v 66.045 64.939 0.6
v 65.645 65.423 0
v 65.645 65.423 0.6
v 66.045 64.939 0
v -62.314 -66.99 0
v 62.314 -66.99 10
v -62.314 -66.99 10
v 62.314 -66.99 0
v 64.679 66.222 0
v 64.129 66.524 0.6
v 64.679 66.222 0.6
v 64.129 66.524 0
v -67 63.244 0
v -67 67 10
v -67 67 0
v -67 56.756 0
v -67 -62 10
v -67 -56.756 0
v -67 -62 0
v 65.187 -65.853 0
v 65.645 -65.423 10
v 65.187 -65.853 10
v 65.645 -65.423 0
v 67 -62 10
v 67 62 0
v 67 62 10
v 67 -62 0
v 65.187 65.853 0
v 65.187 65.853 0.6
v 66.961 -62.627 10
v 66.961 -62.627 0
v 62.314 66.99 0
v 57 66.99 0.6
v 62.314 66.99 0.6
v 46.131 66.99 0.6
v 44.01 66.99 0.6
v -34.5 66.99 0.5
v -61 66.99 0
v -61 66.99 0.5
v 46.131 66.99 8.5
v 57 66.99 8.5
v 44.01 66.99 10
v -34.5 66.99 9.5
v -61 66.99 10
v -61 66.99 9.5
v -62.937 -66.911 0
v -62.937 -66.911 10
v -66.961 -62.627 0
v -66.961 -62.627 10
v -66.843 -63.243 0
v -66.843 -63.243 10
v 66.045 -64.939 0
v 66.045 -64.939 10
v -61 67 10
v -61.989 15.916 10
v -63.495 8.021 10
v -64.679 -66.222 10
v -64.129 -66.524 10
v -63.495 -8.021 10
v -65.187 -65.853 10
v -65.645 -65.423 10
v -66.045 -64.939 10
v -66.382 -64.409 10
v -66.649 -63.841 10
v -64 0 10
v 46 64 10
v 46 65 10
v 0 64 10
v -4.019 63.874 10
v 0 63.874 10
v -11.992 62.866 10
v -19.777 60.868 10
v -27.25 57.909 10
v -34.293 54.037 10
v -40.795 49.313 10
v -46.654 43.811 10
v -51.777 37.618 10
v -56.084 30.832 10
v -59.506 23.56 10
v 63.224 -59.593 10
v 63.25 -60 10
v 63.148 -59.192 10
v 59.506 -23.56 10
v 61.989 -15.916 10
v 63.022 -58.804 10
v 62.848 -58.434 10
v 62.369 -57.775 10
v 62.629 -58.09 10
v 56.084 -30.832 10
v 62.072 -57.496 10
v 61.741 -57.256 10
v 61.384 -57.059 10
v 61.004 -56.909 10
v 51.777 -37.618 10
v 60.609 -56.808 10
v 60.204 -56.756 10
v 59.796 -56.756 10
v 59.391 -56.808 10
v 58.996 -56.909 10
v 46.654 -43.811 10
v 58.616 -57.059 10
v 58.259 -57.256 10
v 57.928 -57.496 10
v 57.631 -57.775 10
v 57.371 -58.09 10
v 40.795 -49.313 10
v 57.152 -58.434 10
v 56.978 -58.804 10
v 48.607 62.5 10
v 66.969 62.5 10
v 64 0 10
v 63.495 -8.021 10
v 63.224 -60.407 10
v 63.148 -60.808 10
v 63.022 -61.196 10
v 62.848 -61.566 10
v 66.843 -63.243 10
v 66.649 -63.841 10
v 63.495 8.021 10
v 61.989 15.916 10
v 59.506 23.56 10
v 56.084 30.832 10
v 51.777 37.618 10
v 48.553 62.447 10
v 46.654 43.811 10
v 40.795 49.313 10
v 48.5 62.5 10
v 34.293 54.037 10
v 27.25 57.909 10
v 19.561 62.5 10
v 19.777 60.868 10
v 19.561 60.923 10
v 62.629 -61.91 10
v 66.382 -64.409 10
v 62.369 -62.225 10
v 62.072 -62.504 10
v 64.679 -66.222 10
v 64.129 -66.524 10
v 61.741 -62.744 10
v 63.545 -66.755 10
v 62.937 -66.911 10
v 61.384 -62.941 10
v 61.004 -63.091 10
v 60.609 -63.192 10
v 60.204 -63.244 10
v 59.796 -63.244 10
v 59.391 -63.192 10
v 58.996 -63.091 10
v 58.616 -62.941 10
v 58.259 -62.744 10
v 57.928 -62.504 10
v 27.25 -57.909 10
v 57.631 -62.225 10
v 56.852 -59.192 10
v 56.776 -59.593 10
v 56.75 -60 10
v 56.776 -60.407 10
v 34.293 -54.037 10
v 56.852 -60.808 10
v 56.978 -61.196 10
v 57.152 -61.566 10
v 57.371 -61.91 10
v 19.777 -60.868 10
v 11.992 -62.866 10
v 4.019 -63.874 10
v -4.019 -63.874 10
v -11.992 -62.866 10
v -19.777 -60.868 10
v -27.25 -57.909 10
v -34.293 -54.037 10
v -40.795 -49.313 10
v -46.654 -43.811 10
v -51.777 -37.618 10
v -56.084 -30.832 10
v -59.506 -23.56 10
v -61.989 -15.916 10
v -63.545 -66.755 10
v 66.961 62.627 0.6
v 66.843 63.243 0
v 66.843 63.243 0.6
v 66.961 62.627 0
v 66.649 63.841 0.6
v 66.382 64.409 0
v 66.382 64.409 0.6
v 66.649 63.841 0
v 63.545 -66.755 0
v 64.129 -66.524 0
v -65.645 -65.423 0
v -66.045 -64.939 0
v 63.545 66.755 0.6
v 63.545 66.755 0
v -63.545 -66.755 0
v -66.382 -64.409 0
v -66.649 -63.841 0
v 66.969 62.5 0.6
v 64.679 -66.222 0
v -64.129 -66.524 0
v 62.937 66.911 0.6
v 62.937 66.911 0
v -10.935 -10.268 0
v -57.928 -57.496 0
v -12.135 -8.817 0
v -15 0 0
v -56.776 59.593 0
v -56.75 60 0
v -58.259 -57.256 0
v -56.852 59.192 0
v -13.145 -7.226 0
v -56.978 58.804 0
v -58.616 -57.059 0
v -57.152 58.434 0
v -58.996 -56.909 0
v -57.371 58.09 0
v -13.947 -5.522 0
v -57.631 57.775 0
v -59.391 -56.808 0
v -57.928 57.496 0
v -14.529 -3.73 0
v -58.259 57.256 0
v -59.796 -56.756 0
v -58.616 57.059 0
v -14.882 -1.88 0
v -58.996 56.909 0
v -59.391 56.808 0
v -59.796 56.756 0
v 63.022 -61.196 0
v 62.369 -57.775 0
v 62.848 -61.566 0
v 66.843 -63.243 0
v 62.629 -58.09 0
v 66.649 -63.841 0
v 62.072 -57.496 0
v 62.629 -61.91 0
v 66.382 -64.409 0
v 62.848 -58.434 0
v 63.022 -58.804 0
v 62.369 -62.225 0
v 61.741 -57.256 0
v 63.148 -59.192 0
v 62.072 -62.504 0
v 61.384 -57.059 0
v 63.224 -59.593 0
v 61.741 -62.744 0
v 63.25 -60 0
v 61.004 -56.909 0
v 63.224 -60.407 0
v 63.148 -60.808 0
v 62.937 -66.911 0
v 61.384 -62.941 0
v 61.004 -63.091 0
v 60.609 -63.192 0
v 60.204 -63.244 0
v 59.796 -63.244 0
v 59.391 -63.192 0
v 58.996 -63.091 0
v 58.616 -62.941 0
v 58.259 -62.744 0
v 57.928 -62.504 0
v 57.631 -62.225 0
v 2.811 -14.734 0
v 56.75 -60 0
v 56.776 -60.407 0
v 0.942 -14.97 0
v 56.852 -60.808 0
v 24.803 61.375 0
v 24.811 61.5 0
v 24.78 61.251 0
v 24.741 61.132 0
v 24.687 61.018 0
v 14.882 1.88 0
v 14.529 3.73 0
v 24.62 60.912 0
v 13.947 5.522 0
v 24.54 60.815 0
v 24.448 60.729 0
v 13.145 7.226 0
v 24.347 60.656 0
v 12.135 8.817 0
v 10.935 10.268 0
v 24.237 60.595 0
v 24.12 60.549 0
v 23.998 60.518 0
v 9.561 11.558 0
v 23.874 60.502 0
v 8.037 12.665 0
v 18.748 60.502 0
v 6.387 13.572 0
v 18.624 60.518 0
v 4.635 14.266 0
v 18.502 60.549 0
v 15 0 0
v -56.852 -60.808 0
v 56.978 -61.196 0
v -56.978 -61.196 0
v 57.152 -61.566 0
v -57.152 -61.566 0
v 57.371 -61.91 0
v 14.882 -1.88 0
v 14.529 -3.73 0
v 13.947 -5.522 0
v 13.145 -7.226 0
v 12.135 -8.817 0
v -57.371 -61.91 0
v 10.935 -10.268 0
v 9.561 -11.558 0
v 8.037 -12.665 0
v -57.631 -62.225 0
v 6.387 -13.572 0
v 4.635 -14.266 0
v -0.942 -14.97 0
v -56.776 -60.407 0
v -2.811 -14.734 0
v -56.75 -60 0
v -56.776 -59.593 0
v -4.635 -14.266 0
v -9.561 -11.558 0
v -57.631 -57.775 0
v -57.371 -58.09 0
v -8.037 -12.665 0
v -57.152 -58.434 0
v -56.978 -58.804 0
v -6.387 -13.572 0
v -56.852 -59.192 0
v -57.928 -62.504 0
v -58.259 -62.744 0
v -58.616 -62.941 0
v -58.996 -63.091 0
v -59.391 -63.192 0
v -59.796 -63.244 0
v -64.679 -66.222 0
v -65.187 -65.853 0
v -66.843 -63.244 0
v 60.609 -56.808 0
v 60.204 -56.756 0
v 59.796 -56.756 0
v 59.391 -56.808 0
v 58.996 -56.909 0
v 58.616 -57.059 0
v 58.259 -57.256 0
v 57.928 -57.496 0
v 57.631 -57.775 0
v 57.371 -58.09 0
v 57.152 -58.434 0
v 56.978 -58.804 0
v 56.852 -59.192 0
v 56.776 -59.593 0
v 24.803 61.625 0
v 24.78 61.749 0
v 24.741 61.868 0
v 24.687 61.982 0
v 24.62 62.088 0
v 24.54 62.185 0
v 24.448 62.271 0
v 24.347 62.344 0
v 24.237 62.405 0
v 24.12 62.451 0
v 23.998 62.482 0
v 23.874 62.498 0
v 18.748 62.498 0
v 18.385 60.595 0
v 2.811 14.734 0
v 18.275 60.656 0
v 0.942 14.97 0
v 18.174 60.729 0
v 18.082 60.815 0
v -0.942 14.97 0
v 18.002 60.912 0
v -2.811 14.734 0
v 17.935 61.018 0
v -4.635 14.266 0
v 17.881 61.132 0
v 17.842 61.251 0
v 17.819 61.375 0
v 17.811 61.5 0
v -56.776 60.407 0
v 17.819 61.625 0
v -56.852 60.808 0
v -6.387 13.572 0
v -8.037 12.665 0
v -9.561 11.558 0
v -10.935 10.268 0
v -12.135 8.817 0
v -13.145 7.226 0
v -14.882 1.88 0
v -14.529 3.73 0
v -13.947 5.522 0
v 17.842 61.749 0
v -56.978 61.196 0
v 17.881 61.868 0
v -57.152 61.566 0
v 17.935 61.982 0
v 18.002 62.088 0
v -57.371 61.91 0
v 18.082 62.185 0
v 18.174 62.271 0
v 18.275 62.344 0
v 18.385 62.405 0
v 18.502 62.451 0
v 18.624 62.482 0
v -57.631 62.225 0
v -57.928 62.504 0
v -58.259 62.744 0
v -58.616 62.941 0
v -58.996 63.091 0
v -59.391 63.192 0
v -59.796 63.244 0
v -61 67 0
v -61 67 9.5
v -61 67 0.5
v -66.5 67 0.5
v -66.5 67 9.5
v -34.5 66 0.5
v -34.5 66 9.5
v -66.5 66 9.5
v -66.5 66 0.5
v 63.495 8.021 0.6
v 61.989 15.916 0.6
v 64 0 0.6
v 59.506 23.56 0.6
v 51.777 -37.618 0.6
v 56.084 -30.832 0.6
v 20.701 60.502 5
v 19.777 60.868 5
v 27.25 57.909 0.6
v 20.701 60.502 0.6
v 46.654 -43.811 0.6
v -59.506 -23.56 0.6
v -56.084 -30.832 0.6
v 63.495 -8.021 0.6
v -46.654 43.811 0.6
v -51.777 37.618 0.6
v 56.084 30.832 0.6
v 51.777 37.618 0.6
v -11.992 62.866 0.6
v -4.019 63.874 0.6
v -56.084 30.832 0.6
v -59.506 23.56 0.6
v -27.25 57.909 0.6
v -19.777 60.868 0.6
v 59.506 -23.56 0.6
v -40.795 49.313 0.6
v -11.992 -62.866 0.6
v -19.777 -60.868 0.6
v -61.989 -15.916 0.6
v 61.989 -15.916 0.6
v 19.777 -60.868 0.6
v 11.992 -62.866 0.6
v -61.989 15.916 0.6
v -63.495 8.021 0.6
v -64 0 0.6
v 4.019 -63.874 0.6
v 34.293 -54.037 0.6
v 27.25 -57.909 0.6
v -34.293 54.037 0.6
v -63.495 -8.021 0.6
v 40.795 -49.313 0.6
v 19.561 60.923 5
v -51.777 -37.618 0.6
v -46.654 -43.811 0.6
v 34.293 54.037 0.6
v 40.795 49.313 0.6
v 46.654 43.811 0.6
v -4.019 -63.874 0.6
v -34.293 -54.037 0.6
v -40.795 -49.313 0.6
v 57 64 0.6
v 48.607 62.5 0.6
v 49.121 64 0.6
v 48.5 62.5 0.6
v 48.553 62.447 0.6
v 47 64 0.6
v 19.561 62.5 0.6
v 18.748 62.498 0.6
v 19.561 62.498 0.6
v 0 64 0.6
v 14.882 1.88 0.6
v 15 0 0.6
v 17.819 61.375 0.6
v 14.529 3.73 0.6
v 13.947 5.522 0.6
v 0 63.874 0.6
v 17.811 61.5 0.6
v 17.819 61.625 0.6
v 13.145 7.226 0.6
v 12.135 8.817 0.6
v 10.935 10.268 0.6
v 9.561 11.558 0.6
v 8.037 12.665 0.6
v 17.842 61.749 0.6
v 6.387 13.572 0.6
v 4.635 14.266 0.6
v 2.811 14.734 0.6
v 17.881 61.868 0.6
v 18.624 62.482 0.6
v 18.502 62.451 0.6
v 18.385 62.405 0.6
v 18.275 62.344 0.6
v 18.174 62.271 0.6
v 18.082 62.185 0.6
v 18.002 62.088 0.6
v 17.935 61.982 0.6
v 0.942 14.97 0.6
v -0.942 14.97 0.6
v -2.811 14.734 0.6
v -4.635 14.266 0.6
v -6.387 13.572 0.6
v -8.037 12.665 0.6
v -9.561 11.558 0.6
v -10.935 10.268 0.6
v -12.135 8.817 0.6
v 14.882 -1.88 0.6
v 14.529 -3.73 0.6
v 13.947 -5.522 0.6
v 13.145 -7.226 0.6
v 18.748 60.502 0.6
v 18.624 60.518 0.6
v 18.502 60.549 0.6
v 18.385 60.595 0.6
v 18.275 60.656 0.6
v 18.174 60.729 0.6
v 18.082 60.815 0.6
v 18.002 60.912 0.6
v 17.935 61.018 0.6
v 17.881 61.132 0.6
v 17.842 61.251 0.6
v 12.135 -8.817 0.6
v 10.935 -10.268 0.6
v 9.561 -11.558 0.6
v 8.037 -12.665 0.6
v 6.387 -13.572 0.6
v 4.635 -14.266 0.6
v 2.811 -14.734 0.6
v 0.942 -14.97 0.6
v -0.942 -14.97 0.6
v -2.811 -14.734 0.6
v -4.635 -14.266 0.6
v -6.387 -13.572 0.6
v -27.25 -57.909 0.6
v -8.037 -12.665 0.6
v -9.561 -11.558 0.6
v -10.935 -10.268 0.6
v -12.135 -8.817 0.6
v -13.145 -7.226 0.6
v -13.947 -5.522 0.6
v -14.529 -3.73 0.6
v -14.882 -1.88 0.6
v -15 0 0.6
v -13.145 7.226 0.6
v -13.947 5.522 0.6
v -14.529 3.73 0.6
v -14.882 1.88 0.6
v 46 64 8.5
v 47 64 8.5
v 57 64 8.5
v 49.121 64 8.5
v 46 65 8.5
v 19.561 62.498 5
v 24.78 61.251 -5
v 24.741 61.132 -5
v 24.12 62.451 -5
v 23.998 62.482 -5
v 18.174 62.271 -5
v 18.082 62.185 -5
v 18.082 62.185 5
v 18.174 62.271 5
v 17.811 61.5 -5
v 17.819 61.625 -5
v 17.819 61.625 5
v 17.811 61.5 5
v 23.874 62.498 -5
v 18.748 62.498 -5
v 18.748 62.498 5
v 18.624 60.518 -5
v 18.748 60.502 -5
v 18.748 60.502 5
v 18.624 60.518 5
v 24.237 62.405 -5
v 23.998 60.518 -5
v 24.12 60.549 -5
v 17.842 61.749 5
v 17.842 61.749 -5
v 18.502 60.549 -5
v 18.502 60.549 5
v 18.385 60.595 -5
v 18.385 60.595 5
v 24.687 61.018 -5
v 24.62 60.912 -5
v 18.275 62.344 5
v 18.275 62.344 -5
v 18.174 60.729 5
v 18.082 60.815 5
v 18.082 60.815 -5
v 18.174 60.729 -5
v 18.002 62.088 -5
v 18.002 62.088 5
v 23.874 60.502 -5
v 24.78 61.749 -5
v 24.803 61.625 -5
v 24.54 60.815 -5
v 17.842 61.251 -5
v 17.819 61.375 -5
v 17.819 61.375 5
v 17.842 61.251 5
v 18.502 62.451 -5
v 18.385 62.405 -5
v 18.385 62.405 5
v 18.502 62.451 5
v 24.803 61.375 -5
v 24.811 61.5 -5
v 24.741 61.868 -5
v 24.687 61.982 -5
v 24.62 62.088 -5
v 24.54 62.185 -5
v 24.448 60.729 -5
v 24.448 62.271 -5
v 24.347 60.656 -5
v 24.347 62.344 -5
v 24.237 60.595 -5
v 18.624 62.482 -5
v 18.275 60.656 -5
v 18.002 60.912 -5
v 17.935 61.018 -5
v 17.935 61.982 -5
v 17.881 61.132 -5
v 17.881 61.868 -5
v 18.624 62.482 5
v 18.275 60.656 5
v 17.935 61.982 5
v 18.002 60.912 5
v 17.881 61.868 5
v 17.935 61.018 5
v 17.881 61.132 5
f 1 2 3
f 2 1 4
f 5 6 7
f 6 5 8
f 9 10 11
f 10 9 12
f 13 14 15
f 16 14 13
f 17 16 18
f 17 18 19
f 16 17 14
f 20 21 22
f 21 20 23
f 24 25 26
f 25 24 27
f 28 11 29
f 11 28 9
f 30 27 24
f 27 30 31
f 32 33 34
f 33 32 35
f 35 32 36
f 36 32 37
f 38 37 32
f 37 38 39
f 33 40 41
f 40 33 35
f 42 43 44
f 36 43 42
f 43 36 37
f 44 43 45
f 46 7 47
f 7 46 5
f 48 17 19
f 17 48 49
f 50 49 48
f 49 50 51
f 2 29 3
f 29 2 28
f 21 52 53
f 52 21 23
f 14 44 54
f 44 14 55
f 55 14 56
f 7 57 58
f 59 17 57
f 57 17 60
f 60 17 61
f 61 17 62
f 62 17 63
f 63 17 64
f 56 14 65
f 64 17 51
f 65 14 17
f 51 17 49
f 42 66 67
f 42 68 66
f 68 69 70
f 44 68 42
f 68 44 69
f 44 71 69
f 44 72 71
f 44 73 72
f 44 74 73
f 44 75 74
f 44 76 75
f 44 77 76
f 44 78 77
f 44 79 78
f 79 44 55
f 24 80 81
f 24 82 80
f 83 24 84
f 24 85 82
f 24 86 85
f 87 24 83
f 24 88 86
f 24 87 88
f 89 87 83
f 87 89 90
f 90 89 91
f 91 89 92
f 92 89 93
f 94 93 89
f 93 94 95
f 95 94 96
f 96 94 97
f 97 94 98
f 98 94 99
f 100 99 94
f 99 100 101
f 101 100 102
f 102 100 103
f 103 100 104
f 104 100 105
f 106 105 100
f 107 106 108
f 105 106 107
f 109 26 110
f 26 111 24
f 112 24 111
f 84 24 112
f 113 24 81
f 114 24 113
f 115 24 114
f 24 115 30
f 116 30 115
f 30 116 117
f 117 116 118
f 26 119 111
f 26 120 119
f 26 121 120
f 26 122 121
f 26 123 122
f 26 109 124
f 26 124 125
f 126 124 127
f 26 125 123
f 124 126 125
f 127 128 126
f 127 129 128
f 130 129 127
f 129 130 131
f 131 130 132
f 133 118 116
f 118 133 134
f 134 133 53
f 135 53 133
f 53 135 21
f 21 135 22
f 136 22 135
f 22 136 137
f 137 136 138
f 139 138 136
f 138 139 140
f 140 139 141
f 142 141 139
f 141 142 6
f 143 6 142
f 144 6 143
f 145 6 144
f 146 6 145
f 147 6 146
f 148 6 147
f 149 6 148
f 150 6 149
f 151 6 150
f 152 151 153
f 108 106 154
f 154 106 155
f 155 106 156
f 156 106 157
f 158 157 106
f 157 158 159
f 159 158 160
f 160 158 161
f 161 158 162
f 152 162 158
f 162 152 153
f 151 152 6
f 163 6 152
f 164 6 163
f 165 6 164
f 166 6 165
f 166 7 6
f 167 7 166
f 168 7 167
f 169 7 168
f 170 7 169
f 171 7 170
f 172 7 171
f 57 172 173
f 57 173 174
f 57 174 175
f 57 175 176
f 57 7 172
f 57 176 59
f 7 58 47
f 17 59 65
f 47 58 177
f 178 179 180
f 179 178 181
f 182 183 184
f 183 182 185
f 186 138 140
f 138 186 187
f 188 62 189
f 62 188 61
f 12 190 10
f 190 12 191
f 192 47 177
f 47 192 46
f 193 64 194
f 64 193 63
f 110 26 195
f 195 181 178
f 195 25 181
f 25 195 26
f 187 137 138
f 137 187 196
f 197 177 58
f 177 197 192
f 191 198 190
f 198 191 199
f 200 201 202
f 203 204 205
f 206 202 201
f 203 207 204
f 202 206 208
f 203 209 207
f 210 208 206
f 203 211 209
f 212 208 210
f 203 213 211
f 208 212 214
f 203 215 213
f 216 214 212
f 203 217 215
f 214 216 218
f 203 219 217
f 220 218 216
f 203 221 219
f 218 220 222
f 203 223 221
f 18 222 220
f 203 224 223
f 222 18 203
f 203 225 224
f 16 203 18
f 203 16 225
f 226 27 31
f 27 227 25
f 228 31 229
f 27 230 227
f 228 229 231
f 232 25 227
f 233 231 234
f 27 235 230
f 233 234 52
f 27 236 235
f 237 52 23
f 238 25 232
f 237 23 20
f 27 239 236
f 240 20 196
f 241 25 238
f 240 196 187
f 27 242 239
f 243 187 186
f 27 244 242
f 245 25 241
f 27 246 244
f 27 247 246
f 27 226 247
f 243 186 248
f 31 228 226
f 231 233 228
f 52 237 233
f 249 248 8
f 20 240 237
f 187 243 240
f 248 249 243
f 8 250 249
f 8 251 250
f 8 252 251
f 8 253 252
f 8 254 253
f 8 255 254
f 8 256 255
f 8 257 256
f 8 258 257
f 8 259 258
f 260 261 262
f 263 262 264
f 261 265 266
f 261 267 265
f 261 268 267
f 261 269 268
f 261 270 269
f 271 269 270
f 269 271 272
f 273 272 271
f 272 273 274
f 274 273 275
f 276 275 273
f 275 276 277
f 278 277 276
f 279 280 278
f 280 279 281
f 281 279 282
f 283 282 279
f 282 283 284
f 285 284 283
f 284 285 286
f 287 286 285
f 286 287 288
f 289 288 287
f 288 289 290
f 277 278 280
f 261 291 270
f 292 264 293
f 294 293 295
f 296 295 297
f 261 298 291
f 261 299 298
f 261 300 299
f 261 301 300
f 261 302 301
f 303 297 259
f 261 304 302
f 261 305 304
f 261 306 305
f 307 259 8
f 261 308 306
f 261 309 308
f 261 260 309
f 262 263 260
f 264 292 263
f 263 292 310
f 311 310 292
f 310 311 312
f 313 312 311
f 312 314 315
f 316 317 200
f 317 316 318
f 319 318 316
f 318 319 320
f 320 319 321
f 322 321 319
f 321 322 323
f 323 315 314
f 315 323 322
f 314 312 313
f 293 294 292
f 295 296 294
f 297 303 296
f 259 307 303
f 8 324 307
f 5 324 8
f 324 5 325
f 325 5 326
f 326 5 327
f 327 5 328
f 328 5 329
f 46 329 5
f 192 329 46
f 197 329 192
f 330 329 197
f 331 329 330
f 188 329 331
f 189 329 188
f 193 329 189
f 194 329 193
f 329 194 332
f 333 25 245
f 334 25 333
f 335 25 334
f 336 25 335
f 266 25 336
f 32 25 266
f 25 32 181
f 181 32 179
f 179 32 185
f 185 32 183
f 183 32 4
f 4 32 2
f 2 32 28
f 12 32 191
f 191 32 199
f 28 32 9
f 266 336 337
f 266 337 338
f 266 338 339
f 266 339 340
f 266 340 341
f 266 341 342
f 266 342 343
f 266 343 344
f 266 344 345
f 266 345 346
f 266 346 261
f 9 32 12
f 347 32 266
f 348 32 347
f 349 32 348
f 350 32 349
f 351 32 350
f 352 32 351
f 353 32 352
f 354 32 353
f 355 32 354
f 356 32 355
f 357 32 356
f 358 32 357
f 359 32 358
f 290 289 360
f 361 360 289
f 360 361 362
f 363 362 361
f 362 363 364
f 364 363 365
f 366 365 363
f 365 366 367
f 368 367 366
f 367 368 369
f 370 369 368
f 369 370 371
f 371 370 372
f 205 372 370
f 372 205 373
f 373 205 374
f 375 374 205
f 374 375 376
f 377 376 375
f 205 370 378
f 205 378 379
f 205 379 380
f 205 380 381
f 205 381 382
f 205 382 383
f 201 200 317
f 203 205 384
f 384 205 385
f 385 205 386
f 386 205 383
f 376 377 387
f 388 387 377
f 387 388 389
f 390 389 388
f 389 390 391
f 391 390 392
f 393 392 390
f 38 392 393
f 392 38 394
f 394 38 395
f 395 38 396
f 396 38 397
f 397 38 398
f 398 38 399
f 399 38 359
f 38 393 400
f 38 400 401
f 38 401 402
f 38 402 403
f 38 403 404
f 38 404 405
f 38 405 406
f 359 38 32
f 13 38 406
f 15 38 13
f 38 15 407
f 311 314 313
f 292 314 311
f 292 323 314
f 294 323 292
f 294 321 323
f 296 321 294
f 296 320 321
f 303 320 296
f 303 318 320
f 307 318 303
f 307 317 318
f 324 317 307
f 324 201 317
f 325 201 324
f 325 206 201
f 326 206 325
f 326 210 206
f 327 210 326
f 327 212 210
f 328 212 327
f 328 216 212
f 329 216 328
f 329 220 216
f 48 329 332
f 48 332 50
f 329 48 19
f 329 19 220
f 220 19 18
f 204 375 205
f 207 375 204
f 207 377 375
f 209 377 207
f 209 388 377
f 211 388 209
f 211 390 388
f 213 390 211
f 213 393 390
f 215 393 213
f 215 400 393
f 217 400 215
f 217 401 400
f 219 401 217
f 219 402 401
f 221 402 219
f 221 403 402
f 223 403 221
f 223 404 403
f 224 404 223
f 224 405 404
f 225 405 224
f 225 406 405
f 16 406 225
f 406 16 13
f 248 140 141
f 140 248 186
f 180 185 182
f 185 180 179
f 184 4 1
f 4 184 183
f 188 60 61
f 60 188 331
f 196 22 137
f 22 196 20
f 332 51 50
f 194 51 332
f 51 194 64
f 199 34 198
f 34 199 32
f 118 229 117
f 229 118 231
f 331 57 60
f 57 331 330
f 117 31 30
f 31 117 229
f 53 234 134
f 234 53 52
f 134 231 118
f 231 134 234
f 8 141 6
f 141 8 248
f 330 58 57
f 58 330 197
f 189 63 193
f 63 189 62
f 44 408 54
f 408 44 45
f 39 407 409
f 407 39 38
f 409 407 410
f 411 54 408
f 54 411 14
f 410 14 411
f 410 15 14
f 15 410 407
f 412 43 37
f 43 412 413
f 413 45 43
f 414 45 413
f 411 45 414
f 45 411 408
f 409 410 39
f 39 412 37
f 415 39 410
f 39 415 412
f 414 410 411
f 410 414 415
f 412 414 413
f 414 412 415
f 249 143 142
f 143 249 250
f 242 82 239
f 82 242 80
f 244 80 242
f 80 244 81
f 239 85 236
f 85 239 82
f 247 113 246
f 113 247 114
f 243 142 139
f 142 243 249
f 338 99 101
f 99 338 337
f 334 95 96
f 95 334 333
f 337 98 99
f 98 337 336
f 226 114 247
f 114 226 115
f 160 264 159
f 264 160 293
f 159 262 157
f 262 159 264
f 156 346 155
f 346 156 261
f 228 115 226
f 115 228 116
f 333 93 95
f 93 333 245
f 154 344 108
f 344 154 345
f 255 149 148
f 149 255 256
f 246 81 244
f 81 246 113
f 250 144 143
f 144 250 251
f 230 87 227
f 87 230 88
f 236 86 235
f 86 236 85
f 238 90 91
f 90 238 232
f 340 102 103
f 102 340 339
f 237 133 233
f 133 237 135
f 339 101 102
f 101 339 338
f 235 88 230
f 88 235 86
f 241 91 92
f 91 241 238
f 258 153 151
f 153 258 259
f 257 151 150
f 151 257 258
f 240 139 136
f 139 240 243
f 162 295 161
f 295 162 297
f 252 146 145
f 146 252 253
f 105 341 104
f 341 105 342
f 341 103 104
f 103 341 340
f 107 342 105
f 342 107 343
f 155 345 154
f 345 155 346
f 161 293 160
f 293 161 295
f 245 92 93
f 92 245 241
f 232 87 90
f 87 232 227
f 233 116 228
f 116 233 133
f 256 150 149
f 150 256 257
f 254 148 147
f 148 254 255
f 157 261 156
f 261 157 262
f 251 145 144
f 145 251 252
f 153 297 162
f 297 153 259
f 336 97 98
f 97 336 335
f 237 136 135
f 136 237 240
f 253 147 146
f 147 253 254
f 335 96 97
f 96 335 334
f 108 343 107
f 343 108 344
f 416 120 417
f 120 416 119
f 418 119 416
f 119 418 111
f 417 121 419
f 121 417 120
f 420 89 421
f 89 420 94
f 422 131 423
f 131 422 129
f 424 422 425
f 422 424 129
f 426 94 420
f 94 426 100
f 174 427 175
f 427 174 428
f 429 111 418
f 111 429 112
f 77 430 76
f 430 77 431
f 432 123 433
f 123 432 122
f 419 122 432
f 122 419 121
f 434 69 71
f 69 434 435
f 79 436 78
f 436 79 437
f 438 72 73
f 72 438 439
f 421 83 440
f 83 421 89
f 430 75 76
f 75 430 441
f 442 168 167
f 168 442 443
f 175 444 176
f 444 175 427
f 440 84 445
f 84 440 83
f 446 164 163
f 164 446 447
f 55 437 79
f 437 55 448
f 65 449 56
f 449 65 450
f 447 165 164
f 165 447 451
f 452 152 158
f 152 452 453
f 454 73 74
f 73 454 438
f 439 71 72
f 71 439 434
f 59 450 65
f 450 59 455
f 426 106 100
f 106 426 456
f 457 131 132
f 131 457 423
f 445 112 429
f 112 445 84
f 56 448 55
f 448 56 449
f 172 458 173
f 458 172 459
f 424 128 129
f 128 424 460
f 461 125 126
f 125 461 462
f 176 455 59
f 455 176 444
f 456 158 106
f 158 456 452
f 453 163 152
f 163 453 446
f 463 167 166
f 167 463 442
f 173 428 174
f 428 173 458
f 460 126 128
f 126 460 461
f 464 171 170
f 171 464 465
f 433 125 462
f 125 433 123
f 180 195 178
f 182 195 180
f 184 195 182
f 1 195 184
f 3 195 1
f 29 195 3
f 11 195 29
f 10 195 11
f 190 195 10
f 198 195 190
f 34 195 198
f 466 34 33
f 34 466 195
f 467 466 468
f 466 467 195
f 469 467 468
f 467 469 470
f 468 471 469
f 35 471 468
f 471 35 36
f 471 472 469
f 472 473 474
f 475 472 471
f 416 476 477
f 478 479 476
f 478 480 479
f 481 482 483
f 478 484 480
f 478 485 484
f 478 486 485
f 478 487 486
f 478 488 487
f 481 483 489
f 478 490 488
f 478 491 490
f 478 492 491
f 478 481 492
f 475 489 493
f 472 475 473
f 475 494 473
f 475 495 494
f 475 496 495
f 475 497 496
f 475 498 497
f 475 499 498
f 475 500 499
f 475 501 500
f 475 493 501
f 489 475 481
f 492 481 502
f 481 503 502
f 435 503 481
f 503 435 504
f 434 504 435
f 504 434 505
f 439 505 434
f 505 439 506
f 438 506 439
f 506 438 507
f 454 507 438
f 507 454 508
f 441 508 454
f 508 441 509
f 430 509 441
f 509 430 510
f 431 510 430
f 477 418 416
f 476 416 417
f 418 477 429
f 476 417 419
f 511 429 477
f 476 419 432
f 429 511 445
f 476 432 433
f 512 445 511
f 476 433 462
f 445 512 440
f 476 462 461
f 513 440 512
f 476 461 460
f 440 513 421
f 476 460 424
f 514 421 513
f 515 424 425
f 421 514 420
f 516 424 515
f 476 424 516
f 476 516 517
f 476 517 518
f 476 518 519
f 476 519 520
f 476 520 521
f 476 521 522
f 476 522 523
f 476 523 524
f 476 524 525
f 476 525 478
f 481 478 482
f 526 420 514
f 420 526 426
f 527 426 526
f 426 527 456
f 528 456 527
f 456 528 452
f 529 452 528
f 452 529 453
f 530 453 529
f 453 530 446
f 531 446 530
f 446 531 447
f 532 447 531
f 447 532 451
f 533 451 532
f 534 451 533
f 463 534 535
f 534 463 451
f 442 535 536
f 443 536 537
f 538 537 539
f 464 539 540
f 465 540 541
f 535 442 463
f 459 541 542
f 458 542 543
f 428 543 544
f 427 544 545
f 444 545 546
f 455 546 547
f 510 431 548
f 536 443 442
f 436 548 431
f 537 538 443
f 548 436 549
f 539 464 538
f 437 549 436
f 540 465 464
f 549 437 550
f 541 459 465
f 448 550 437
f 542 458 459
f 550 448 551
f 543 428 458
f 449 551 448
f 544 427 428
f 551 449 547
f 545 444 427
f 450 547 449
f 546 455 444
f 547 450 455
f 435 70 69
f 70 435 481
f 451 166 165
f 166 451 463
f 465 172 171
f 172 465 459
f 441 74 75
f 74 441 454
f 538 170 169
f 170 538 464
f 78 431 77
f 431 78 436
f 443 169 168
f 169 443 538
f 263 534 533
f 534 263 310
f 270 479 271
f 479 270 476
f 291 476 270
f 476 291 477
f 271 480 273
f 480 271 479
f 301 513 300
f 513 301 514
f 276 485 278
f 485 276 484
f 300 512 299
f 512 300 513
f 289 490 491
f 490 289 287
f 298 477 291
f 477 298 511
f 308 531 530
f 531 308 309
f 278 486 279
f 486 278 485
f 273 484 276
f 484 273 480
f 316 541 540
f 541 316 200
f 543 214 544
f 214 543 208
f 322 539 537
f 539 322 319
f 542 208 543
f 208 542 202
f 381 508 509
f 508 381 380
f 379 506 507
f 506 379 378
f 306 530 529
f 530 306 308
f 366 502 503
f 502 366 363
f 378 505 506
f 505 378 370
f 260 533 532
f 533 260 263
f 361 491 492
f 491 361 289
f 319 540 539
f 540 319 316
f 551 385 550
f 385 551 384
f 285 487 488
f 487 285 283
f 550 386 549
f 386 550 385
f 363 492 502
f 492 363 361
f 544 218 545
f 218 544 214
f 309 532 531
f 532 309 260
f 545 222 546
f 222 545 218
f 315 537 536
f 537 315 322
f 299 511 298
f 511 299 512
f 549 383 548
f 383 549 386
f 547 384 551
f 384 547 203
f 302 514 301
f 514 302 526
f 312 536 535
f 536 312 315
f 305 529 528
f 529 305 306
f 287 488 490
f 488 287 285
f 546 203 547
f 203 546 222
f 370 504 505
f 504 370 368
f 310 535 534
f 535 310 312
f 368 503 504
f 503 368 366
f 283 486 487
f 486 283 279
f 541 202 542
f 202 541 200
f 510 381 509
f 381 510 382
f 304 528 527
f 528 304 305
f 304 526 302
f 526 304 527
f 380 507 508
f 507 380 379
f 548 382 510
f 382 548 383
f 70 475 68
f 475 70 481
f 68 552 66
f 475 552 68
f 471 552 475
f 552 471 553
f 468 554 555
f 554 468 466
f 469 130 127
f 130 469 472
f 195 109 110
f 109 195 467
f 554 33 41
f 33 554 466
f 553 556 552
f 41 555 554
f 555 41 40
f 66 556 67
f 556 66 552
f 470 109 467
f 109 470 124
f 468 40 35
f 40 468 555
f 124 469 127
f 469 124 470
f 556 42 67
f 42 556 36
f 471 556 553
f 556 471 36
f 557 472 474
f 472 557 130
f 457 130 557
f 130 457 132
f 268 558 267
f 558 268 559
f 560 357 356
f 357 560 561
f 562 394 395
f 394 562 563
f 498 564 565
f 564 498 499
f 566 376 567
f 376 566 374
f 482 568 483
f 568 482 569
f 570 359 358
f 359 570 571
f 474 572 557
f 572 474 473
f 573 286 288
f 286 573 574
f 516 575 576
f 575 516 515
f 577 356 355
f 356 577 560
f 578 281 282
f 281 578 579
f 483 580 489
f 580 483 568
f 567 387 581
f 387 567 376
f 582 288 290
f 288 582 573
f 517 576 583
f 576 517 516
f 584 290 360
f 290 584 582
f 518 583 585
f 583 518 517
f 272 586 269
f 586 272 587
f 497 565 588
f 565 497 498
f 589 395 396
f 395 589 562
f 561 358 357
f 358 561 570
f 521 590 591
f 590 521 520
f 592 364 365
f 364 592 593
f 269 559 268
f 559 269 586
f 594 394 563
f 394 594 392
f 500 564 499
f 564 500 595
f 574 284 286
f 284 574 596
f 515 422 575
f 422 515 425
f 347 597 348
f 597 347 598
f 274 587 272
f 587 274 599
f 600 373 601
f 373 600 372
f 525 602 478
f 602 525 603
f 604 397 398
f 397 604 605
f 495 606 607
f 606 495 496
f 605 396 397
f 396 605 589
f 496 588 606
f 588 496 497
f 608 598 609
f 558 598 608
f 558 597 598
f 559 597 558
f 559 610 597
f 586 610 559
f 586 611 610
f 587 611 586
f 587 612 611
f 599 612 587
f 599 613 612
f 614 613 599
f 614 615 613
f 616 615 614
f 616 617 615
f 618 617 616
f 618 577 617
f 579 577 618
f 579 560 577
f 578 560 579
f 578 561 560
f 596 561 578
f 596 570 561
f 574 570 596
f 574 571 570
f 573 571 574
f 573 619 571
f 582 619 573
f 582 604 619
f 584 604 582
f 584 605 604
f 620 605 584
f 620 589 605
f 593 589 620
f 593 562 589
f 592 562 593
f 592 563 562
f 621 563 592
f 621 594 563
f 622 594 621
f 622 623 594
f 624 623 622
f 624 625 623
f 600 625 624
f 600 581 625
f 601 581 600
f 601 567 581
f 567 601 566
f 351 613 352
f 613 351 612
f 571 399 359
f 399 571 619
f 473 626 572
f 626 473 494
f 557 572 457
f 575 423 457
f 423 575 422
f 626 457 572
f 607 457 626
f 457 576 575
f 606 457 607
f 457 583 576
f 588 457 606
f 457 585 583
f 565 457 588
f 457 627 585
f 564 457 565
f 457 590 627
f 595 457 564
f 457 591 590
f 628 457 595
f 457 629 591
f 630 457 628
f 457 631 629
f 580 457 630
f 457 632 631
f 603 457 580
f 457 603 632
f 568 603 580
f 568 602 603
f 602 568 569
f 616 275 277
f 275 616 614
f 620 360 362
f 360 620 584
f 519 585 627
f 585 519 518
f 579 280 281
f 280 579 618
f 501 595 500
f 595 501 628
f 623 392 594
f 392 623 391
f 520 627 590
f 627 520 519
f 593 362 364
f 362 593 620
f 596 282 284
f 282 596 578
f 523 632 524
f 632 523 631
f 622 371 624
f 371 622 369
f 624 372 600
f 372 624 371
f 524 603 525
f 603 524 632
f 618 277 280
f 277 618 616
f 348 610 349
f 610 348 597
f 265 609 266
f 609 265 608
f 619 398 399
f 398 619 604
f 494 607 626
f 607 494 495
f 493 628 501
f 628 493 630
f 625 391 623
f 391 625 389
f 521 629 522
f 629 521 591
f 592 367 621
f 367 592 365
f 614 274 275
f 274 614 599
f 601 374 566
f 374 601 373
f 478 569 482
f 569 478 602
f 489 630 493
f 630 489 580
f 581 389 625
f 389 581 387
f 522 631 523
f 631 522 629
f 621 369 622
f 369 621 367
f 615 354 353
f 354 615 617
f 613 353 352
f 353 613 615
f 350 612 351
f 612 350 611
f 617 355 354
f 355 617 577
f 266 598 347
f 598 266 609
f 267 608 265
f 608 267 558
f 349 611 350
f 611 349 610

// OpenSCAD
$fn = 50;


union() {
	difference() {
		union() {
			hull() {
				translate(v = [-62.0000000000, 62.0000000000, 0]) {
					cylinder(h = 10, r = 5);
				}
				translate(v = [62.0000000000, 62.0000000000, 0]) {
					cylinder(h = 10, r = 5);
				}
				translate(v = [-62.0000000000, -62.0000000000, 0]) {
					cylinder(h = 10, r = 5);
				}
				translate(v = [62.0000000000, -62.0000000000, 0]) {
					cylinder(h = 10, r = 5);
				}
			}
			translate(v = [-67.0000000000, 61.0000000000, 0]) {
				cube(size = [6, 6, 10]);
			}
		}
		union() {
			translate(v = [-67.5000000000, -60.0000000000, -250.0000000000]) {
				rotate(a = [0, 0, 0]) {
					difference() {
						union() {
							hull() {
								translate(v = [7.5000000000, 0, 0]) {
									cylinder(h = 250, r = 3.2500000000, r1 = 3.2500000000, r2 = 3.2500000000);
								}
								translate(v = [-7.5000000000, 0, 0]) {
									cylinder(h = 250, r = 3.2500000000, r1 = 3.2500000000, r2 = 3.2500000000);
								}
							}
						}
						union();
					}
				}
			}
			translate(v = [-67.5000000000, 60.0000000000, -250.0000000000]) {
				rotate(a = [0, 0, 0]) {
					difference() {
						union() {
							hull() {
								translate(v = [7.5000000000, 0, 0]) {
									cylinder(h = 250, r = 3.2500000000, r1 = 3.2500000000, r2 = 3.2500000000);
								}
								translate(v = [-7.5000000000, 0, 0]) {
									cylinder(h = 250, r = 3.2500000000, r1 = 3.2500000000, r2 = 3.2500000000);
								}
							}
						}
						union();
					}
				}
			}
			translate(v = [-66.5000000000, 66.0000000000, 0.5000000000]) {
				cube(size = [32, 1, 9.0000000000]);
			}
			translate(v = [60.0000000000, -60.0000000000, 0]) {
				cylinder(h = 100, r = 3.2500000000);
			}
			translate(v = [0, 0, 0.6000000000]) {
				cylinder(h = 12.4000000000, r = 64.0000000000);
			}
			translate(v = [0, 0, -5.0000000000]) {
				cylinder(h = 10, r = 15.0000000000);
			}
			translate(v = [0.0000000000, 62.5000000000, 0.6000000000]) {
				cube(size = [67.0000000000, 1.5000000000, 12.4000000000]);
			}
			translate(v = [57.0000000000, 62.5000000000, 0.6000000000]) {
				cube(size = [10, 4.5000000000, 12.4000000000]);
			}
			translate(v = [46.0000000000, 62.5000000000, 8.5000000000]) {
				cube(size = [21, 4.5000000000, 1.5000000000]);
			}
			translate(v = [43.2500000000, 67.7500000000, 0.6000000000]) {
				rotate(a = [0, 0, -45]) {
					cube(size = [7.5000000000, 1.5000000000, 12.4000000000]);
				}
			}
			translate(v = [12.0610000000, 60.5000000000, 0.6000000000]) {
				cube(size = [7.5000000000, 2, 9.4000000000]);
			}
		}
	}
	union() {
		translate(v = [21.3110000000, 61.5000000000, -5.0000000000]) {
			rotate(a = [0, 0, 0]) {
				difference() {
					union() {
						#hull() {
							#translate(v = [2.5000000000, 0, 0]) {
								cylinder(h = 10, r = 1.0000000000, r1 = 1.0000000000, r2 = 1.0000000000);
							}
							#translate(v = [-2.5000000000, 0, 0]) {
								cylinder(h = 10, r = 1.0000000000, r1 = 1.0000000000, r2 = 1.0000000000);
							}
						}
					}
					union();
				}
			}
		}
	}
}
